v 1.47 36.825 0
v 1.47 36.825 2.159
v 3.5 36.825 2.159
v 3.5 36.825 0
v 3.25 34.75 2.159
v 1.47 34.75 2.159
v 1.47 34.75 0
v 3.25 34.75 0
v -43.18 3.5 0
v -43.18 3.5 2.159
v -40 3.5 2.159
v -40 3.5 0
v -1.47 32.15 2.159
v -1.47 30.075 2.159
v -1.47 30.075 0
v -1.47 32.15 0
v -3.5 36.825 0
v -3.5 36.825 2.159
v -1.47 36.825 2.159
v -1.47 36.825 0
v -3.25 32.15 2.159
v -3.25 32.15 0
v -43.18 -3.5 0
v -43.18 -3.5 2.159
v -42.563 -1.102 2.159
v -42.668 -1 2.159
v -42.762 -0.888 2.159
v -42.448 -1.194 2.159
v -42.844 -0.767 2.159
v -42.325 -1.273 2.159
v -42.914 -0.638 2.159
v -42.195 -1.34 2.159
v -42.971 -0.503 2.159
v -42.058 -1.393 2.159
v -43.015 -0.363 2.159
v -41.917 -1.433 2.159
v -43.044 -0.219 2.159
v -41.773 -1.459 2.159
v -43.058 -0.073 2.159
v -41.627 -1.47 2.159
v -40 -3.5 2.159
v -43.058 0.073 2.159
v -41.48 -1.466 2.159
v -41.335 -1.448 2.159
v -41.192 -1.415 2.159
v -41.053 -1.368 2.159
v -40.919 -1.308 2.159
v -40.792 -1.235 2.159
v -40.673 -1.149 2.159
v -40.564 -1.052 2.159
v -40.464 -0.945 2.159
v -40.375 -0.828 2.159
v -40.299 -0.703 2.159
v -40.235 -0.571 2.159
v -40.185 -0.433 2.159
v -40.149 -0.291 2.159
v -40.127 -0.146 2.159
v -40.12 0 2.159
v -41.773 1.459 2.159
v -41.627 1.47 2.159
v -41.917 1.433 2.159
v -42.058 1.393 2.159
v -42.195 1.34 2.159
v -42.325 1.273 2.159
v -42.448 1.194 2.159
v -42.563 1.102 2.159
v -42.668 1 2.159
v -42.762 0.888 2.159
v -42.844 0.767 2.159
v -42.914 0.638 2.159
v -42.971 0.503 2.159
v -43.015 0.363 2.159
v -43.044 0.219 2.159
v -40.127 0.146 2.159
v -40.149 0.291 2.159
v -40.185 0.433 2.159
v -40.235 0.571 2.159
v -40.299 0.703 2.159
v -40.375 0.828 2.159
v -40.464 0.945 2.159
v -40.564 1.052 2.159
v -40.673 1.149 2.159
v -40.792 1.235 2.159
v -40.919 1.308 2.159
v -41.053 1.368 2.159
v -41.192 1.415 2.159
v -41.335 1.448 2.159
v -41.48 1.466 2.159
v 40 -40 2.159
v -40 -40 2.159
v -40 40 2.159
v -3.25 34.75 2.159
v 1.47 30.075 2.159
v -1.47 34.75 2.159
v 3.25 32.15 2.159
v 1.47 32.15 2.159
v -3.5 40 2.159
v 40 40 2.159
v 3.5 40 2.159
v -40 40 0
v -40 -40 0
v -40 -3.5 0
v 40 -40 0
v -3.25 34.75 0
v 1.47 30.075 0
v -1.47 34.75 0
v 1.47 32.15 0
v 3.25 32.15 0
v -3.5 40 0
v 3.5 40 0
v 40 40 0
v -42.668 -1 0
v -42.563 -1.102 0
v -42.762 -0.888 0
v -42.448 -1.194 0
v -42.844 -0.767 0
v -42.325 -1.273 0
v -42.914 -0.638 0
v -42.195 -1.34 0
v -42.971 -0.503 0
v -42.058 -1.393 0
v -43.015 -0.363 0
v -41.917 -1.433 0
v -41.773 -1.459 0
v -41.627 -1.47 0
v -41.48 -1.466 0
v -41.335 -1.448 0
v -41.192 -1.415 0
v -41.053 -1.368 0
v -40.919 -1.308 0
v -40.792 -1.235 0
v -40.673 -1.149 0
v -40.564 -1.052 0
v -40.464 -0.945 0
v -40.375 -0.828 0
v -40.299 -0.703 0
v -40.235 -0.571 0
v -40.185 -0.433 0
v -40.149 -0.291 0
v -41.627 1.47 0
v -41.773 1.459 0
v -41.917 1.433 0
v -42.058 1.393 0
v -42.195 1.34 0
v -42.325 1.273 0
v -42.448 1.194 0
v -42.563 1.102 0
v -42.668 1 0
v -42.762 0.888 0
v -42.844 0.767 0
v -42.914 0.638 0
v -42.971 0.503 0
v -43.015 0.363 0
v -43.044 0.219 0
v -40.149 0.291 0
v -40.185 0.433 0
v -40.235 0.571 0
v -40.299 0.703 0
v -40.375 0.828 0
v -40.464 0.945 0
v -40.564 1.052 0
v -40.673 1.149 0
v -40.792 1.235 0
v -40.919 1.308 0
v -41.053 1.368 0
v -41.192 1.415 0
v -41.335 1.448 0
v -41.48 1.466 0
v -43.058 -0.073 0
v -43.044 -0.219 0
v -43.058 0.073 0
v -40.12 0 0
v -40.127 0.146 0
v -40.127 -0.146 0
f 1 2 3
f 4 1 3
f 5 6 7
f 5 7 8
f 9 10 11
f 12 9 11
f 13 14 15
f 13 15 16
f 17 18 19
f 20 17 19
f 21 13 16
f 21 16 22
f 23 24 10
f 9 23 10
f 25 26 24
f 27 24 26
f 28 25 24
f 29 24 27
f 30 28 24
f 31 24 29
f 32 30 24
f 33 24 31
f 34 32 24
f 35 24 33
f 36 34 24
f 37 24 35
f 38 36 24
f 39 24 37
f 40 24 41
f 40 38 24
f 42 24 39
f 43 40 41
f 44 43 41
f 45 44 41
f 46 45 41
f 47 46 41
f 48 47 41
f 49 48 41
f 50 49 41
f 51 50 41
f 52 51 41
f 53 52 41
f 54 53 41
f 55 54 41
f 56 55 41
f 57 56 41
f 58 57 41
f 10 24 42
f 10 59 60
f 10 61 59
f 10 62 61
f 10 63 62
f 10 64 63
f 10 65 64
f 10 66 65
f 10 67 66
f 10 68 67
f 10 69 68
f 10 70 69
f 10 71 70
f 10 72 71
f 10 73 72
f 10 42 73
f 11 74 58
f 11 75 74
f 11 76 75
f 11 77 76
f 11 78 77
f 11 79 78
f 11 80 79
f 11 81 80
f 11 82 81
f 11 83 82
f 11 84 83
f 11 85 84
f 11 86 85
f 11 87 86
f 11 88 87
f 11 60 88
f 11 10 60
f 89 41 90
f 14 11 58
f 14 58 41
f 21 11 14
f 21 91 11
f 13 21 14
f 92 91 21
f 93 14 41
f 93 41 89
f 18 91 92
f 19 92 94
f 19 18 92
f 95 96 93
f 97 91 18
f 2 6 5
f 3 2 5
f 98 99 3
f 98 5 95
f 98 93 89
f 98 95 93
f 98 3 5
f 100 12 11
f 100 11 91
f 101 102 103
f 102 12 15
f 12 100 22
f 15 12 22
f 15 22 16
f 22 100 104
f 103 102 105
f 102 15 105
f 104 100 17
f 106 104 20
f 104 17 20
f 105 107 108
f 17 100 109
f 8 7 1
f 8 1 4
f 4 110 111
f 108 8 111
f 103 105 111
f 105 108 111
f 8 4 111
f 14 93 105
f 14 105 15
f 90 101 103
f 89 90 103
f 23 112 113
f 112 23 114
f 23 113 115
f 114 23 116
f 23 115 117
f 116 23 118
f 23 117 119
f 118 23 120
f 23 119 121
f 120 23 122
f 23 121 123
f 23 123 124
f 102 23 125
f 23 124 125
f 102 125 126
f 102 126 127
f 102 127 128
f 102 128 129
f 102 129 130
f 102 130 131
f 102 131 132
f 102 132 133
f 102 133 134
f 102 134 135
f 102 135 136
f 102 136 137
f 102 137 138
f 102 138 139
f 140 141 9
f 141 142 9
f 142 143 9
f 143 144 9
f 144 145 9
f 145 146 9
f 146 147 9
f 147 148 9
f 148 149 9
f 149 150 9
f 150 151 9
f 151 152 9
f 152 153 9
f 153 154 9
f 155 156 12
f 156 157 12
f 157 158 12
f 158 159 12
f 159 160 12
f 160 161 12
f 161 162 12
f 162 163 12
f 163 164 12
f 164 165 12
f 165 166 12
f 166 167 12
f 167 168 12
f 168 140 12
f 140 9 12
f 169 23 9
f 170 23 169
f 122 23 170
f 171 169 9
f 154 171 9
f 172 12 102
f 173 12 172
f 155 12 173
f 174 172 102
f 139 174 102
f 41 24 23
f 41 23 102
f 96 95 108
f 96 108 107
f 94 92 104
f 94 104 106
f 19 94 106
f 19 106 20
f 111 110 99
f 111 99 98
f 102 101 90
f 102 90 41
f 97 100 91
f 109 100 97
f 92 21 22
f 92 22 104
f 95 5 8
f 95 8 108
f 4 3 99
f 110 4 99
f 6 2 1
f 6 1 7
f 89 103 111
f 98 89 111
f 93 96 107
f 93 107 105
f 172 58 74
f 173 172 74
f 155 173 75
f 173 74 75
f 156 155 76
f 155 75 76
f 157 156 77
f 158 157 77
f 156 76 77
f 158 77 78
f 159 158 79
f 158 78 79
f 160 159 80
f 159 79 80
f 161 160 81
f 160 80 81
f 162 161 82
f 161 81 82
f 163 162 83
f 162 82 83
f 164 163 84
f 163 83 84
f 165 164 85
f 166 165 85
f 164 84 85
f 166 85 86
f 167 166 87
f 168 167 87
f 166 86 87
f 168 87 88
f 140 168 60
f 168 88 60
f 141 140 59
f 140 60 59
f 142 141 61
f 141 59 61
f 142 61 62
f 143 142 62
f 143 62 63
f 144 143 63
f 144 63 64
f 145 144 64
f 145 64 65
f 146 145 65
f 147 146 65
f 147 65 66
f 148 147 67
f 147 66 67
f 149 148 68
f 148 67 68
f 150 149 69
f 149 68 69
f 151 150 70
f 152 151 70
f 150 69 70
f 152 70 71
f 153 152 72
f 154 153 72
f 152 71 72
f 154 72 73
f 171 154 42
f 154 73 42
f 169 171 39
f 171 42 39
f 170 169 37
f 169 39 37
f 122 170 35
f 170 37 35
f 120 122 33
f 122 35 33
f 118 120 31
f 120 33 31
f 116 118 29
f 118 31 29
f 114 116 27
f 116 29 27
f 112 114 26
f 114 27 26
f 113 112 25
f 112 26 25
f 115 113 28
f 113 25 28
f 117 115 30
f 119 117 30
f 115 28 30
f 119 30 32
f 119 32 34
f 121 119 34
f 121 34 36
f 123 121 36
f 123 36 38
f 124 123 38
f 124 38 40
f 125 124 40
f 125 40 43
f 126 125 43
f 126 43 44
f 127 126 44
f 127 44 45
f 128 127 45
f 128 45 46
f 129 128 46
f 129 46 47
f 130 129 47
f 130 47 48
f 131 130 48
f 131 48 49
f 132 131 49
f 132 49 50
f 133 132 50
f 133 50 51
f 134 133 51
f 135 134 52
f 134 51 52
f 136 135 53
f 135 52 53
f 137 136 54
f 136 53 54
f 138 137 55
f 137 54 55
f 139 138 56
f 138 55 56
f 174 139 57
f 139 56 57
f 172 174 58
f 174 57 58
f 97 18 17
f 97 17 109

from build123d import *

# Parameters (mm, degrees)
SKETCH1_W           = 80
SKETCH1_H           = 80
BOSS_EXTRUDE1_DEPTH = 2.158807247
SKETCH2_W           = 7
SKETCH2_H           = 3.175
CUT_EXTRUDE1_DEPTH  = 3.158807247
CUT_EXTRUDE2_DEPTH  = 3.158807247
SKETCH4_W           = 3.18
SKETCH4_H           = 7
SKETCH4_R           = 1.47
BOSS_EXTRUDE2_DEPTH = 2.158807


with BuildPart() as part:
    # Sketch1 → Boss-Extrude1 (new body)
    with BuildSketch(Plane.XY):
        Rectangle(SKETCH1_W, SKETCH1_H)
    extrude(amount=BOSS_EXTRUDE1_DEPTH)

    # Sketch2 → Cut-Extrude1 (cut, through all)
    with BuildSketch(Plane.XY.offset(2.158807247)):
        with Locations((0, 38.4125)):
            Rectangle(SKETCH2_W, SKETCH2_H)
    extrude(amount=-CUT_EXTRUDE1_DEPTH, mode=Mode.SUBTRACT)

    # Sketch3 → Cut-Extrude2 (cut, through all)
    with BuildSketch(Plane.XY.offset(2.158807247)):
        Polygon((1.47, 34.75), (3.25, 34.75), (3.25, 32.15), (1.47, 32.15), (1.47, 30.075), (-1.47, 30.075), (-1.47, 32.15), (-3.25, 32.15), (-3.25, 34.75), (-1.47, 34.75), (-1.47, 36.825), (1.47, 36.825), align=None)
    extrude(amount=-CUT_EXTRUDE2_DEPTH, mode=Mode.SUBTRACT)

    # Sketch4 → Boss-Extrude2 (add)
    with BuildSketch(Plane.XY.offset(2.158807247)):
        with Locations((-41.59, 0)):
            Rectangle(SKETCH4_W, SKETCH4_H)
        with Locations((-41.59, 0)):
            Circle(SKETCH4_R, mode=Mode.SUBTRACT)
    extrude(amount=-BOSS_EXTRUDE2_DEPTH)


solid = part.part
